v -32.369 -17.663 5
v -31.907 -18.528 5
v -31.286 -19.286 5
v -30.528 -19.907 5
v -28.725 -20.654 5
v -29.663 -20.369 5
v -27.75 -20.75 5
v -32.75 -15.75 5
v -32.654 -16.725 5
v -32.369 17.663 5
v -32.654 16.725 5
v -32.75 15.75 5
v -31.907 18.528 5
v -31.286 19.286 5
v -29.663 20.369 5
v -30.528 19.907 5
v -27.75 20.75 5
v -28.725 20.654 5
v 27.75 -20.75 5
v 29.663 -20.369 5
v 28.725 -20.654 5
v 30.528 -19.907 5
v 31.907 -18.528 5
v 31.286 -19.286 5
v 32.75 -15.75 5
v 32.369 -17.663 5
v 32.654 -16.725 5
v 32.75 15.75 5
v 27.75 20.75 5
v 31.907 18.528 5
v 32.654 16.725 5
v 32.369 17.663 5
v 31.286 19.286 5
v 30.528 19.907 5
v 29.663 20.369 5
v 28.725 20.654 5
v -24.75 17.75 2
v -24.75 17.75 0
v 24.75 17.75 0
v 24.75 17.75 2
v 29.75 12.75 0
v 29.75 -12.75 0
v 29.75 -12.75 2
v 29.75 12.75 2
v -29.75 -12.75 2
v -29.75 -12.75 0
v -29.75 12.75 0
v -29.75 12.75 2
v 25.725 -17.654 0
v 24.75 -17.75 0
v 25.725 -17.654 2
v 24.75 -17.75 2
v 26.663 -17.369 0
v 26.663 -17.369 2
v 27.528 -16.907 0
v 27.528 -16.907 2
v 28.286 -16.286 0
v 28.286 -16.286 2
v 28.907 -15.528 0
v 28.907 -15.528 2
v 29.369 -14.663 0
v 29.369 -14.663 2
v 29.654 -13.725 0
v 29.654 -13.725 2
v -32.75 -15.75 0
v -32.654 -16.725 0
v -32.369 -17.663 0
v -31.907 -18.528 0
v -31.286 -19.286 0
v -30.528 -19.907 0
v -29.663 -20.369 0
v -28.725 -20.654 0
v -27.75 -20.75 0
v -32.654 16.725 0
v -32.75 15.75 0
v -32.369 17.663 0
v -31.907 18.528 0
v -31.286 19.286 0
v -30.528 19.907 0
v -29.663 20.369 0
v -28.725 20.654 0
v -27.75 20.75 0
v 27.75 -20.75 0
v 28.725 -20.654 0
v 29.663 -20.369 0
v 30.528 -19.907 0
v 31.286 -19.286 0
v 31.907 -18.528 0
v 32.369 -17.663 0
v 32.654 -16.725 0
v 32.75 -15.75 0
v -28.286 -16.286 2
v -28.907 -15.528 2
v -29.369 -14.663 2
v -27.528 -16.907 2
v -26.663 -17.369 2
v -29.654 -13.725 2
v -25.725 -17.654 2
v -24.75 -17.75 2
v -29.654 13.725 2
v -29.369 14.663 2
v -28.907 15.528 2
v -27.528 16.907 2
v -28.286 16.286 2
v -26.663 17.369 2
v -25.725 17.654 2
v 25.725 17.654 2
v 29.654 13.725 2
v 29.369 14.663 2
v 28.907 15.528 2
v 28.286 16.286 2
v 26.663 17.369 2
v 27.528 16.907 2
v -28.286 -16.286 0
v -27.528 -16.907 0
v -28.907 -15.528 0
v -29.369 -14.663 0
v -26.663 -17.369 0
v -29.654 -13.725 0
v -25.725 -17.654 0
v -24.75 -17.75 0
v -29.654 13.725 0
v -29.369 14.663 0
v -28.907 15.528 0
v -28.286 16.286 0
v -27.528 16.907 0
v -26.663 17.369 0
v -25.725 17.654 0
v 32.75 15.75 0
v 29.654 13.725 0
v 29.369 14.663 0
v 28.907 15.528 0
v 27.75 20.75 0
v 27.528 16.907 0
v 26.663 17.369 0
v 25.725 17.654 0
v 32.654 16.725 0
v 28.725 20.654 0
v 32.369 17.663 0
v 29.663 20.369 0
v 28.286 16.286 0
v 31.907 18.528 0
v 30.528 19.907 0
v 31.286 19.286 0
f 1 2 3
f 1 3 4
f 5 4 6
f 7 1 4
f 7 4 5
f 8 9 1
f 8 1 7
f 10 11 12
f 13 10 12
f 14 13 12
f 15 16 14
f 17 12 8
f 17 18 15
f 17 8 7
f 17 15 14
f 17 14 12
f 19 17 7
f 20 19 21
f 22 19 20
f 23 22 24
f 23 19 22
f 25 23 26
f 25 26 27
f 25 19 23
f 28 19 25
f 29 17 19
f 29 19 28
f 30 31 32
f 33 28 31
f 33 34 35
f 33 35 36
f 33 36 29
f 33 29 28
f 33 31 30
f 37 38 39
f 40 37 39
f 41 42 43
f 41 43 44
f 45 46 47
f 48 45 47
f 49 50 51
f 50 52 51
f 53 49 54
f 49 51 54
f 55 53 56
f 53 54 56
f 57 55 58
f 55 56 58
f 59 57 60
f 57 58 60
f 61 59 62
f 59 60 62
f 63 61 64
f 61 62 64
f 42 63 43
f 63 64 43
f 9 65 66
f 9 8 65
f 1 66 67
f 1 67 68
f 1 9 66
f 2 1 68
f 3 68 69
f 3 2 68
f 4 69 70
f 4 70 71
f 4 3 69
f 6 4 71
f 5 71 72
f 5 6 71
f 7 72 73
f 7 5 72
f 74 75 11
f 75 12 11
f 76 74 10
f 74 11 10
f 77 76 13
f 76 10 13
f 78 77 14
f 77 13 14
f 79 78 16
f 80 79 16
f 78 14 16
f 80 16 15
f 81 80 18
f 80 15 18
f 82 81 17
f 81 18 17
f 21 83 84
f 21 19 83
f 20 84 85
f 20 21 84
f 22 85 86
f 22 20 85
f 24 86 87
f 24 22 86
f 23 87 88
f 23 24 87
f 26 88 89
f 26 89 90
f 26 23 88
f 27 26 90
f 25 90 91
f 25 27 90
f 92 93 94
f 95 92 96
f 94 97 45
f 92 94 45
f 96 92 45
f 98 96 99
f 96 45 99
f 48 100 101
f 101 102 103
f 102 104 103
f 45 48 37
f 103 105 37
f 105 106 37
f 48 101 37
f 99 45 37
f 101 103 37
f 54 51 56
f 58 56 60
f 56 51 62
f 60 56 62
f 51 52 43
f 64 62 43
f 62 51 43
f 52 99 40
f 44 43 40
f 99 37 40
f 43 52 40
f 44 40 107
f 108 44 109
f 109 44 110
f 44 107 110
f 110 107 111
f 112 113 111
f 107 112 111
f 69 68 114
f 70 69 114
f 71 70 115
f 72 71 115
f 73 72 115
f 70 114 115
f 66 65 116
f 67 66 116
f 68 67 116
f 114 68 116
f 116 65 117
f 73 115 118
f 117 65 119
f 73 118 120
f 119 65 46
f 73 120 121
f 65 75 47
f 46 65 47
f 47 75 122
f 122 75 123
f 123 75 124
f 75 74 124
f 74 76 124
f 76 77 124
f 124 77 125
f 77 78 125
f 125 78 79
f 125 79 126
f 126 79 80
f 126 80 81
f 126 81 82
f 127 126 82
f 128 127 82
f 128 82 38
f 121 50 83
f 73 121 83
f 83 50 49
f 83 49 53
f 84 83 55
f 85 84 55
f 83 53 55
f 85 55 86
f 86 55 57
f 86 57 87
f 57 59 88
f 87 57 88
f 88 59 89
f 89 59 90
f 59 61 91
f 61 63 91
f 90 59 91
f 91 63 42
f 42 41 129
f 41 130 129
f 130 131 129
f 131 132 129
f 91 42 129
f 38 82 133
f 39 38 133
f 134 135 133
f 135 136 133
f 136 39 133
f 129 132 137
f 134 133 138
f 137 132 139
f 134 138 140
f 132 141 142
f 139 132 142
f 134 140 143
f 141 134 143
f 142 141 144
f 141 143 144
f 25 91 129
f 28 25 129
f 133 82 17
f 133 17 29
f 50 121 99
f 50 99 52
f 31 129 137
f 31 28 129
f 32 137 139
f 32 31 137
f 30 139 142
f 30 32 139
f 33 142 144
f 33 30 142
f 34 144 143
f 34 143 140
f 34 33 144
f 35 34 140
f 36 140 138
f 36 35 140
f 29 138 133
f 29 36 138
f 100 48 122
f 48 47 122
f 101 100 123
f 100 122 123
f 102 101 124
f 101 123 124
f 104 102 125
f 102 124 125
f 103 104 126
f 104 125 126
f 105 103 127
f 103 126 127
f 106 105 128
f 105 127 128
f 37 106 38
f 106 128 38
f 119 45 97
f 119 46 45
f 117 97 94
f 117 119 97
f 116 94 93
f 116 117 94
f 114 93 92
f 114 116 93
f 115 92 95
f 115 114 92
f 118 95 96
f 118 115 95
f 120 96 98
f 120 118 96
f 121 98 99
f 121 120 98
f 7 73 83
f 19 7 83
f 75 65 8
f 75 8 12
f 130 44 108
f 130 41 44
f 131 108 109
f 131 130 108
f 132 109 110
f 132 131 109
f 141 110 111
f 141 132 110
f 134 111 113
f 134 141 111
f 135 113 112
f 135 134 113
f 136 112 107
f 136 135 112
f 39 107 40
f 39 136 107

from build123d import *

# Parameters (mm, degrees)
ESQUISSE1_W        = 65.5
ESQUISSE1_H        = 41.5
BOSS_EXTRU_1_DEPTH = 5
COQUE1_T           = -3
CONG_1_R           = 5


with BuildPart() as part:
    # Esquisse1 → Boss.-Extru.1 (new body)
    with BuildSketch(Plane.XY):
        Rectangle(ESQUISSE1_W, ESQUISSE1_H)
    extrude(amount=BOSS_EXTRU_1_DEPTH)

    # Coque1
    coque1_openings = [part.faces().sort_by_distance(p)[0] for p in [
        (0, 0, 0),
    ]]
    offset(amount=COQUE1_T, openings=coque1_openings, kind=Kind.INTERSECTION)

    # Congé1
    cong_1_edges = [part.edges().sort_by_distance(p)[0] for p in [
        (29.75, -17.75, 1),
        (29.75, 17.75, 1),
        (-29.75, 17.75, 1),
        (-29.75, -17.75, 1),
        (32.75, -20.75, 2.5),
        (-32.75, -20.75, 2.5),
        (-32.75, 20.75, 2.5),
        (32.75, 20.75, 2.5),
    ]]
    fillet(cong_1_edges, radius=CONG_1_R)


solid = part.part
